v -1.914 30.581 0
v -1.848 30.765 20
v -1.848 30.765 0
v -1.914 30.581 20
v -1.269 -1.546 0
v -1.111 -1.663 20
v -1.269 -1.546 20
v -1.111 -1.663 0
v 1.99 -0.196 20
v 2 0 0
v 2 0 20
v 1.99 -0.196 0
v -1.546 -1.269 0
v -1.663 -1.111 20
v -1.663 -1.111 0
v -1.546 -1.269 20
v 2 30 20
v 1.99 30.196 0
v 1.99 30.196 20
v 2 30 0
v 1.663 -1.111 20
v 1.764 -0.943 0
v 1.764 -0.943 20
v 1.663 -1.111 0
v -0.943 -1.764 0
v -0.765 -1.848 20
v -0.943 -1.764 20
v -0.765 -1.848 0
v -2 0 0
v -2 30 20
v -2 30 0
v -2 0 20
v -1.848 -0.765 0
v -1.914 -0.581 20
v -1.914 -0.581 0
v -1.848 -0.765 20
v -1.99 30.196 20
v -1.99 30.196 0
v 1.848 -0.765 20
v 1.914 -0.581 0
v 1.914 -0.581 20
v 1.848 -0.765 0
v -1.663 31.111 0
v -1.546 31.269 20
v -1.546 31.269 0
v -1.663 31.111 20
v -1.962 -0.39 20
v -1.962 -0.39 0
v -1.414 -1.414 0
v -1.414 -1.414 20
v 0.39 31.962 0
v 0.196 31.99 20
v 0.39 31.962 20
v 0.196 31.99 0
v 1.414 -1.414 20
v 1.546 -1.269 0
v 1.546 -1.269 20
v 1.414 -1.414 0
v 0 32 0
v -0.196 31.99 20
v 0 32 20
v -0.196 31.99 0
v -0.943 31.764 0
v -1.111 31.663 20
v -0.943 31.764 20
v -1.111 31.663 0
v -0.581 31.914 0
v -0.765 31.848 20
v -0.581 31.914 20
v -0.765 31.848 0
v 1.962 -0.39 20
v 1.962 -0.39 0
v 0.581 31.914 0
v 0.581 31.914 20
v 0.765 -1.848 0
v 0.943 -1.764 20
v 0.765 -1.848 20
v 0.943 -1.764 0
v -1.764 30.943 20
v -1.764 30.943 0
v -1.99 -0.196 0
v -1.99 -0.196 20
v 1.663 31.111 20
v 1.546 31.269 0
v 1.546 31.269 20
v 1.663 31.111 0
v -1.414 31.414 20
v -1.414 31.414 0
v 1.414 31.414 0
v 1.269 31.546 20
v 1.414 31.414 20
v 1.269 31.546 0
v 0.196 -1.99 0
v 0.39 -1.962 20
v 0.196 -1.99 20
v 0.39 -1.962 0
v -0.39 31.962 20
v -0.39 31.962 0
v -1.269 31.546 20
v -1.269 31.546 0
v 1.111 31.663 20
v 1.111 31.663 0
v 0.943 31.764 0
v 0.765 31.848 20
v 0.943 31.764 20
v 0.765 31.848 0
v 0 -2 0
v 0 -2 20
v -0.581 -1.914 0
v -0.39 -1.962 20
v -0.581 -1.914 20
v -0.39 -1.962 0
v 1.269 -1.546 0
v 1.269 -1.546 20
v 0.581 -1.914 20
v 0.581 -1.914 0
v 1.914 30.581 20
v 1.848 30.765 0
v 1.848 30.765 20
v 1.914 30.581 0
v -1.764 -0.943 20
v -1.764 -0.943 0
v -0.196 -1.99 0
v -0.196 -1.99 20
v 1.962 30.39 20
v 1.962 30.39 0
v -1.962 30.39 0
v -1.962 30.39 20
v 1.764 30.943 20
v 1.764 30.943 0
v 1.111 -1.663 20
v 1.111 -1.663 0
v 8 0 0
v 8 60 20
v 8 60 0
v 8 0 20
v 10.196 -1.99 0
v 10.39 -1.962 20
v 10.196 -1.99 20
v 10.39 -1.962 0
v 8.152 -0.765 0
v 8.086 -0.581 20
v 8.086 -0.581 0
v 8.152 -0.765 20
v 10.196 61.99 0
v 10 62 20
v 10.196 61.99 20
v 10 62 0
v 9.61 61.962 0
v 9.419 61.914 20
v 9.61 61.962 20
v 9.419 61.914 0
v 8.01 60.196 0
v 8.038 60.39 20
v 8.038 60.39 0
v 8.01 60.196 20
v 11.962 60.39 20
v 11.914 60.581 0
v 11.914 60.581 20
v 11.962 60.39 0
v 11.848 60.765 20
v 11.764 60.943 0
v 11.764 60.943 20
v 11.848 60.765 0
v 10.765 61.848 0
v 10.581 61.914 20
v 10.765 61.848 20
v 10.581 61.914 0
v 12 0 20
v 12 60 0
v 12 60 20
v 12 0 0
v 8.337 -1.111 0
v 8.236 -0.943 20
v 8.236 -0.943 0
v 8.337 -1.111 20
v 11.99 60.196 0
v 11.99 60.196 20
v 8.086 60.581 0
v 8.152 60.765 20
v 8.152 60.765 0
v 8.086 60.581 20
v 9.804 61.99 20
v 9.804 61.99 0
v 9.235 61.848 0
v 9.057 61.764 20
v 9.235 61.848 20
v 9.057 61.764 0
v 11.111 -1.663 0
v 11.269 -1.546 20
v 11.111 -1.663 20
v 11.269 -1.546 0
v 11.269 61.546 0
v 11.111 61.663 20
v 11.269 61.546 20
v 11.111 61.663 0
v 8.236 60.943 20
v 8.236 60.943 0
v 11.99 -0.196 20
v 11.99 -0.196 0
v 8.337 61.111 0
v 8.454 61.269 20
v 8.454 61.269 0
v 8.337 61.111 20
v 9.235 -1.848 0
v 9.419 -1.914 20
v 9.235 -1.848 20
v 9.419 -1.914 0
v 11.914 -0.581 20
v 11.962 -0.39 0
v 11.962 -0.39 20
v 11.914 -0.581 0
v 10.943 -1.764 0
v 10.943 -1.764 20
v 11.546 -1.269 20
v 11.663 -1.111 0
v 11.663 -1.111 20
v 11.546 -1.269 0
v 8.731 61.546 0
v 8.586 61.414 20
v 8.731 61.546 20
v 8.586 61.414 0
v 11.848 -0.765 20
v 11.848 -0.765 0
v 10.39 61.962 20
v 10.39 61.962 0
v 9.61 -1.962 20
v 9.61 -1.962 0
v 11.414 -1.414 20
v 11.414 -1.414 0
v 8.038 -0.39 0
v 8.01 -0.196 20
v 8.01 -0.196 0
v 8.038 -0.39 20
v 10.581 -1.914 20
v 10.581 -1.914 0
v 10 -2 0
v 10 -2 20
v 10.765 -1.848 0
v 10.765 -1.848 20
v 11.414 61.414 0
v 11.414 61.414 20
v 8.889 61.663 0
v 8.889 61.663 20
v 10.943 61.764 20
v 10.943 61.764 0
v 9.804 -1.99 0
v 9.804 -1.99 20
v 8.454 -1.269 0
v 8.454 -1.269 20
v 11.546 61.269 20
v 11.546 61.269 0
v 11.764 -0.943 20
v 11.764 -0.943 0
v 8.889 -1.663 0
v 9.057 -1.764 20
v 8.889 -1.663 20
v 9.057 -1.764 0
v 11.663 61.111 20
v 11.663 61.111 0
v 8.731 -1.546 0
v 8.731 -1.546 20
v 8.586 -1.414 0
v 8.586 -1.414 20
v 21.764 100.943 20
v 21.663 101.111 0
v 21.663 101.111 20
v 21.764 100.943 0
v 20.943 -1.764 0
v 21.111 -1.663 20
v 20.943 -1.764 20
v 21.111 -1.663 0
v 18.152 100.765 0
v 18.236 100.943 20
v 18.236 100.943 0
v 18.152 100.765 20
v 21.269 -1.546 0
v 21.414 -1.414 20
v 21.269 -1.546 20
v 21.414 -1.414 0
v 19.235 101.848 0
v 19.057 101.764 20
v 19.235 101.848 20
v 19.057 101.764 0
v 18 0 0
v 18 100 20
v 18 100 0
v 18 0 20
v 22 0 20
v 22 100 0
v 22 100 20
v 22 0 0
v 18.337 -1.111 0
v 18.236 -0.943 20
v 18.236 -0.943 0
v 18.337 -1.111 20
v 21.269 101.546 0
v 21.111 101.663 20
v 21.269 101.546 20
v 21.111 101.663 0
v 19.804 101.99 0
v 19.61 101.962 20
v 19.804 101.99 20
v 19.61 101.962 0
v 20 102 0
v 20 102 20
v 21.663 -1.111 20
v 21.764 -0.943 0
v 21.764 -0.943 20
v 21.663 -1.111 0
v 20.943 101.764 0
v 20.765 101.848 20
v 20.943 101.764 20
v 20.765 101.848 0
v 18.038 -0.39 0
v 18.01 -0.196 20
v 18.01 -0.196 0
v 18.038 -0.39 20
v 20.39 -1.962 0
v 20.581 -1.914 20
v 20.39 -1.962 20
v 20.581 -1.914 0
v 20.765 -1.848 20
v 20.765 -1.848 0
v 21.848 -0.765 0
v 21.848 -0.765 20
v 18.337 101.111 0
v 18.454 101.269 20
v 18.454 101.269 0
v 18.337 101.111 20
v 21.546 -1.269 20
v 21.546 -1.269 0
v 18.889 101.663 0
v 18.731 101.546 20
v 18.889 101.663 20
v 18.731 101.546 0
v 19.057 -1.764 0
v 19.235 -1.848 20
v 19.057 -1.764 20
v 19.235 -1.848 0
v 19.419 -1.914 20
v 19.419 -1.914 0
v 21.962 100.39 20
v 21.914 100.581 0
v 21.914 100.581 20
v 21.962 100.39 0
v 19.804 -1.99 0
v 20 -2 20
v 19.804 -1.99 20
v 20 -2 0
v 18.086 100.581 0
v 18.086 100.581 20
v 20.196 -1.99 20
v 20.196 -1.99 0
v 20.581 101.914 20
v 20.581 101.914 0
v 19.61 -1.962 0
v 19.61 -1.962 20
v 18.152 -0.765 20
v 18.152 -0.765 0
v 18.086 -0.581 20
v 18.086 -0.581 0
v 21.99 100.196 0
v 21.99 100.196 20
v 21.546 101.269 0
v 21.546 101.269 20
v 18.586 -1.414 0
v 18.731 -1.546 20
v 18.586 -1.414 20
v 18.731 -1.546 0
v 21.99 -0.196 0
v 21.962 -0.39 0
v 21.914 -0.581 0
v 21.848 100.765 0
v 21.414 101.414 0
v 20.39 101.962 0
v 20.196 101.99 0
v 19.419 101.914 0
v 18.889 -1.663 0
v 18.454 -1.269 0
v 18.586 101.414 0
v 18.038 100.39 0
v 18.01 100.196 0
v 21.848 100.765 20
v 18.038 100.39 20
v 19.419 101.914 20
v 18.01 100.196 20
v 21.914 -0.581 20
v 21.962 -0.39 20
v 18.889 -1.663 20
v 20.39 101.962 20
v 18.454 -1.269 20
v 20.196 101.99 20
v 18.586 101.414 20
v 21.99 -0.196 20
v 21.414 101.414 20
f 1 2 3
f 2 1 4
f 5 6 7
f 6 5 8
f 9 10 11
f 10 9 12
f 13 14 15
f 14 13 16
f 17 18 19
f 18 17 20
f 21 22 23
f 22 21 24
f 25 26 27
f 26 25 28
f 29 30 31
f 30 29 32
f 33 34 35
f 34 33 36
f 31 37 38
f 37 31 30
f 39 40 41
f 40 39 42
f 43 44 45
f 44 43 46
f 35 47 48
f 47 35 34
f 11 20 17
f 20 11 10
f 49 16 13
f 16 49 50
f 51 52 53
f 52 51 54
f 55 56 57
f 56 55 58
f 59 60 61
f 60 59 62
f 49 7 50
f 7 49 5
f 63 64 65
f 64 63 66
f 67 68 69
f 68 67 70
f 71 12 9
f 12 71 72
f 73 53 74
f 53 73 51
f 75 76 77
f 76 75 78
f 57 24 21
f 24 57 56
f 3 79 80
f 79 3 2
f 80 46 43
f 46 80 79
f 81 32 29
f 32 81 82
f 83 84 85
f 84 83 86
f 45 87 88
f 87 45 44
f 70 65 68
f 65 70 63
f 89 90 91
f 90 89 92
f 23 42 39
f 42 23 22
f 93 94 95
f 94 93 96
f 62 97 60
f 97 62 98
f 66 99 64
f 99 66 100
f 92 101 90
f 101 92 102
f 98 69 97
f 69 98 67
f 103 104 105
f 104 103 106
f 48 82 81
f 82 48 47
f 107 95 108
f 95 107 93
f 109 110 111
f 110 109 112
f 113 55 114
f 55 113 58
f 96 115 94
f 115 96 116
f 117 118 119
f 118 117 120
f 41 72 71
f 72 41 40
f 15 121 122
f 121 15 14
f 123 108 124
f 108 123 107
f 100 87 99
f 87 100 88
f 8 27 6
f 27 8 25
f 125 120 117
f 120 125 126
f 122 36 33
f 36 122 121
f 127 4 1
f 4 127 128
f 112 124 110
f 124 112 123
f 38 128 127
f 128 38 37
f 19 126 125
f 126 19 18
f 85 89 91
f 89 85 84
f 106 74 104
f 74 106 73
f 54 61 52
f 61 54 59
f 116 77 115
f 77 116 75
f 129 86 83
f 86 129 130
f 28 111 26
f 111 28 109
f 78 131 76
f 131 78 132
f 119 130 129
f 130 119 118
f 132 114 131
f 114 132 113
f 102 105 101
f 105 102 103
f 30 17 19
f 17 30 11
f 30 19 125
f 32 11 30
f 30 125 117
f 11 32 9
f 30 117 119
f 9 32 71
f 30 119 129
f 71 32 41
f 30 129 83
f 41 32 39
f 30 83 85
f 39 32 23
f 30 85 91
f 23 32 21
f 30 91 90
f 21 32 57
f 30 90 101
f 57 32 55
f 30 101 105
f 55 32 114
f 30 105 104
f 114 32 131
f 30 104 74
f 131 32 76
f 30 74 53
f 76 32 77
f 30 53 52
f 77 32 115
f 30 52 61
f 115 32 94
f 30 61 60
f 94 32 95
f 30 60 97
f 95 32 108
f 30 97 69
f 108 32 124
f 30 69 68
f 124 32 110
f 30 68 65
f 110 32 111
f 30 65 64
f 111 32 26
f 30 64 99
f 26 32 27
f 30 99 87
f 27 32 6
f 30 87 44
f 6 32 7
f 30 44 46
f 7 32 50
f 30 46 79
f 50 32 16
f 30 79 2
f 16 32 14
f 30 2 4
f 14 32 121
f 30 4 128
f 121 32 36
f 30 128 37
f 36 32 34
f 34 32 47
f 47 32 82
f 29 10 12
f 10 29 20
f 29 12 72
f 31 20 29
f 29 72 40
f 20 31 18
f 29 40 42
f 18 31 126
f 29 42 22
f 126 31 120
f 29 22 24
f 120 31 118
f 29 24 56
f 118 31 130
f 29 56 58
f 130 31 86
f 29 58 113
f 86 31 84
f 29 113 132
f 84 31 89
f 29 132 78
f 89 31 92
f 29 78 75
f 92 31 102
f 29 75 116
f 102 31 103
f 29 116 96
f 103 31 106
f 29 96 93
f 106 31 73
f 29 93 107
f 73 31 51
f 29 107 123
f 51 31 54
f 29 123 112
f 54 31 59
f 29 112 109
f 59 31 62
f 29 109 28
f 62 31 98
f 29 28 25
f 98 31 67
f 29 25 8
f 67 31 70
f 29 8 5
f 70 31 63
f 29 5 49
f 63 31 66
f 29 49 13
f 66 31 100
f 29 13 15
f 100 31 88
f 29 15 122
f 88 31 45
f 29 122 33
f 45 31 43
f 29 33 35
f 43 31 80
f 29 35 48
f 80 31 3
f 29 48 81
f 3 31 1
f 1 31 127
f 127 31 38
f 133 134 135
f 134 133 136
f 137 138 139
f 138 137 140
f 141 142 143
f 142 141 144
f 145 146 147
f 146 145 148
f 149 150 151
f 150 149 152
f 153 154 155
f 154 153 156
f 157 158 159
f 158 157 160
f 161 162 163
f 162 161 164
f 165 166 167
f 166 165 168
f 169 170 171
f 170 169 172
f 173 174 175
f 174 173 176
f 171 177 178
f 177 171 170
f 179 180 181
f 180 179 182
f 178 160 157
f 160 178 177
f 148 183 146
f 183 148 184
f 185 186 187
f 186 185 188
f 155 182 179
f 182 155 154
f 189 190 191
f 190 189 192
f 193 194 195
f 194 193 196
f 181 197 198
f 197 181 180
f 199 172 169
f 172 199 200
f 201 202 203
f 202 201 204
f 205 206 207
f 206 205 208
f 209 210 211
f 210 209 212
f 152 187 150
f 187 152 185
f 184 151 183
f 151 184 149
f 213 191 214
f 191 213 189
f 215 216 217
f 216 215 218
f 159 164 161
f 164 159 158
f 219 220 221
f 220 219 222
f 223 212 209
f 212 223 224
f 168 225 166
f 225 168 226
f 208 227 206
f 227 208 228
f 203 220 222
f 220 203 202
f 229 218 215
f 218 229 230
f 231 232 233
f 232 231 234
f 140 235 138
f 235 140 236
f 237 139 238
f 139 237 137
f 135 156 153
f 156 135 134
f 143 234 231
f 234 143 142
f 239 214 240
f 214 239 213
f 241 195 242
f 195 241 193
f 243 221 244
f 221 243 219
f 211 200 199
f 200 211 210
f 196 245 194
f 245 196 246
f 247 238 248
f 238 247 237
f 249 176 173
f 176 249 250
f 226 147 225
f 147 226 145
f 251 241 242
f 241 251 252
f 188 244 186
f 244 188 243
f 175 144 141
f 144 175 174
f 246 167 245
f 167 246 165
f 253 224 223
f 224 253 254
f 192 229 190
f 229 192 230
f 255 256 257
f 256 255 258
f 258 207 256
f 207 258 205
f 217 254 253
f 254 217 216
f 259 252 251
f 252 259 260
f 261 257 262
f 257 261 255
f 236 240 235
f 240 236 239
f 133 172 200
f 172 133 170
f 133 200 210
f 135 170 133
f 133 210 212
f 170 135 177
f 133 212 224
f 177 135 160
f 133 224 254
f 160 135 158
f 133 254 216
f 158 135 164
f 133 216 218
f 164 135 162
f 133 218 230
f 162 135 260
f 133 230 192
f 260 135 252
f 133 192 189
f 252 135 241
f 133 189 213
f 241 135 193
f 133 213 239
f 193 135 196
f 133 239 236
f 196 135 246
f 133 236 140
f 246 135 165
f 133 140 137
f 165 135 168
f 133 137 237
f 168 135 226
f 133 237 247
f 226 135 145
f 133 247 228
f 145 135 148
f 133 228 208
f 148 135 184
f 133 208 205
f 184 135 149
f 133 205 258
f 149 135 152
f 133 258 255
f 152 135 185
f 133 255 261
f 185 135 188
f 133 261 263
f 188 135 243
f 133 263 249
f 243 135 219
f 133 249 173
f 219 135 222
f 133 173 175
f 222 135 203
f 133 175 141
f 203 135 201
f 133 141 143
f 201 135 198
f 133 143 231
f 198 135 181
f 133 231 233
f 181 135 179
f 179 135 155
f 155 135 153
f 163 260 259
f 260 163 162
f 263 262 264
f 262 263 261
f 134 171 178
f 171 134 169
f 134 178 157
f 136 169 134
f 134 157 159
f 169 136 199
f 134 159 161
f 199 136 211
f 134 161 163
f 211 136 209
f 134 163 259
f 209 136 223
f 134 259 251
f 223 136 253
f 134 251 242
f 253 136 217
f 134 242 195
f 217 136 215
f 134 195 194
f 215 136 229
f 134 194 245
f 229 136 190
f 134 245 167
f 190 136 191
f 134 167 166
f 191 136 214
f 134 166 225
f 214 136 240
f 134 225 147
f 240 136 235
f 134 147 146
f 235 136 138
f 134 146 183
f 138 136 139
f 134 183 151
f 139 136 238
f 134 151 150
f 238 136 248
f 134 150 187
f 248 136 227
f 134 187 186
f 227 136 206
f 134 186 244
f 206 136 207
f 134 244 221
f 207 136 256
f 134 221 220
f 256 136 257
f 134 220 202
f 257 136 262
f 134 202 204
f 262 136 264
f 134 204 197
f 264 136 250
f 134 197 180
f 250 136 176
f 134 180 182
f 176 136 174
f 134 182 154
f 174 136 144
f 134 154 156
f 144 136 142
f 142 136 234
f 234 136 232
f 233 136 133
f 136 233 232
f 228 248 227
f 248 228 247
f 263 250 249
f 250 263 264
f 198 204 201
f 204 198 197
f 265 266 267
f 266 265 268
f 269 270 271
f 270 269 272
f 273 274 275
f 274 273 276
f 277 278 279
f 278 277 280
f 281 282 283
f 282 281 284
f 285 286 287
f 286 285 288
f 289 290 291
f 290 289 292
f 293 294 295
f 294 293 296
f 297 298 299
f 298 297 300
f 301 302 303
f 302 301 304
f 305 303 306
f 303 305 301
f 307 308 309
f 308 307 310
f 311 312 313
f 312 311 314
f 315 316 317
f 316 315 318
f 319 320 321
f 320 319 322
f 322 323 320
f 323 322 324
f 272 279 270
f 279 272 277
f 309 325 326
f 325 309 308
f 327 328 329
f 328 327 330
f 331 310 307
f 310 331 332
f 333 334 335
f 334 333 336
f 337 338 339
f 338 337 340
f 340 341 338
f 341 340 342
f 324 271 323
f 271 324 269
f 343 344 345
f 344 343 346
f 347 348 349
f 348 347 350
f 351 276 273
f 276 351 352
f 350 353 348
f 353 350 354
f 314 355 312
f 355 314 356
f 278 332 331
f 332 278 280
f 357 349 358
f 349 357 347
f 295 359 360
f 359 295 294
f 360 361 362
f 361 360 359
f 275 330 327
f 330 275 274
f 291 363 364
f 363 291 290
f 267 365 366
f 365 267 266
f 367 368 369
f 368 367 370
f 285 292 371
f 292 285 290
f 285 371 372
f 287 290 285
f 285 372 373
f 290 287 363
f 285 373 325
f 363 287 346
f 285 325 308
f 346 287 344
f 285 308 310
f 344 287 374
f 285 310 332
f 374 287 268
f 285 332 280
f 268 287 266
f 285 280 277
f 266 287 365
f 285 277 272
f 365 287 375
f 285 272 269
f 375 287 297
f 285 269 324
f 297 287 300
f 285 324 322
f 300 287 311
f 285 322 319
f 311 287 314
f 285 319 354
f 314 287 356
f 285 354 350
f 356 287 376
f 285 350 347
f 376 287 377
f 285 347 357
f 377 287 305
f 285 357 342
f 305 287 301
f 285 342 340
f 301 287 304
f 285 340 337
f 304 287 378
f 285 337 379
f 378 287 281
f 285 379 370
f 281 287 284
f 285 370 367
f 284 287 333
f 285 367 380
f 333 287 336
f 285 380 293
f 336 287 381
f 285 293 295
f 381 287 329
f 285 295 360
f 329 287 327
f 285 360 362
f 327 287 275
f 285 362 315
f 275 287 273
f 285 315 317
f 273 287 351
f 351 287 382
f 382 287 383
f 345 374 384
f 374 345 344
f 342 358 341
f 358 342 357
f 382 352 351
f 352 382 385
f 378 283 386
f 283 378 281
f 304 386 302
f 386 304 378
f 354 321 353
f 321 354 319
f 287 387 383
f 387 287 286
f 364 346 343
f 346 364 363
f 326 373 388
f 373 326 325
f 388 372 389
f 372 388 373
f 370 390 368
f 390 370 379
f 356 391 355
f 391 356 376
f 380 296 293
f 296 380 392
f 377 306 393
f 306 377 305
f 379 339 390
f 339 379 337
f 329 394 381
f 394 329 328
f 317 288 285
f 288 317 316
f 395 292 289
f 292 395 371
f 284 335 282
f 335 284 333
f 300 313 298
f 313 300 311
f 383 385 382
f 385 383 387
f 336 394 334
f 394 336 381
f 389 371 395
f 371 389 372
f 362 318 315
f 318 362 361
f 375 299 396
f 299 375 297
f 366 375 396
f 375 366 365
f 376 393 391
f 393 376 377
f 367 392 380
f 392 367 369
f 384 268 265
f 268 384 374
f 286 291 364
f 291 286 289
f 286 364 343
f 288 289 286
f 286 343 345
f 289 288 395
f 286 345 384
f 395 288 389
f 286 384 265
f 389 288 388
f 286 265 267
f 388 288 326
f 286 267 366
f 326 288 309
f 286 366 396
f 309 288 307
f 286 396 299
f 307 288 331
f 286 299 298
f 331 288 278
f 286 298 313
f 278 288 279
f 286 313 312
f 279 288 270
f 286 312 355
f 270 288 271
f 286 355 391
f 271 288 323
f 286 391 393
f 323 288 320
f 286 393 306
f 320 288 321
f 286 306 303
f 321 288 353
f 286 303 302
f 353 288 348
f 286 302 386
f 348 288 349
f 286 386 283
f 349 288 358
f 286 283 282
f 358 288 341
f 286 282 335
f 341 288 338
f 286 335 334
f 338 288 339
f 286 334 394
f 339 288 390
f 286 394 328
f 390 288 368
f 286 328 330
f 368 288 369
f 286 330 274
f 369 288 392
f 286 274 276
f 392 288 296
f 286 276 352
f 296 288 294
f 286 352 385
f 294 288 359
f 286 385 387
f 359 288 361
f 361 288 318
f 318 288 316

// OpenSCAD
//
// Misc library
//
// by Yasuhiro Wabiko
//
// This work is licensed under a Creative Commons Attribution 4.0 International License.
// https://creativecommons.org/licenses/by/4.0/
//
// See
//    https://github.com/ywabiko/3d/blob/master/Speaker/README.md
// for build instructions.
//

WELDING=0.1;

round2_plate(30,20,2);

translate([10,0,0])
  round2_plate(60,20,2);

translate([20,0,0])
  round2_plate(100,20,2);


module round2_plate(width, height, radius)
{
    hull(){
        translate([0,0,0])
            cylinder(r=radius, h=height, $fn=64);
        translate([0,width,0])
            cylinder(r=radius, h=height, $fn=64);
    }
}


module round2_plate_triangled(width, height, radius1, radius2)
{
    hull(){
        translate([0,0,0])
            cylinder(r=radius1, h=height, $fn=64);
        translate([0,width,0])
            cylinder(r=radius2, h=height, $fn=64);
    }
}


// px,py,pz has to be larger than r*2
// alignment: (x,y,z) = (0, py0/2, 0)
module prim_round_cube(px0, py0, pz0,  pr0, pf)
{
    pr = pr0;
    px = px0 - pr*2;
    py = py0 - pr*2;
    pz = pz0 - pr*2;
    translate([(px+pr*2)/2, 0, (pz+pr*2)/2])
    minkowski(){
        cube([px, py, pz], center=true);
        sphere(r=pr, $fn=32);
    }
}

// px,py,pz has to be larger than r*2
// alignment: (x,y,z) = (0, py0/2, 0)
module prim_round_cube0(px0, py0, pz0,  pr0, pf)
{
    pr = pr0;
    px = px0 - pr*2;
    py = py0 - pr*2;
    pz = pz0 - pr*2;
    translate([0, 0, 0])
    minkowski(){
        cube([px, py, pz], center=true);
        sphere(r=pr, $fn=pf);
    }
}

// px0,py0 = width(x-axis),height(y-axis), center at (0,0), facing x-axis posiive
// pz = thickness (z-axis from z=0)
// pr = r
// fn = $fn
module prim_round_xplate(px0, py0, pz0,  pr, pf)
{
    px = px0;
    py = py0-pr*2;
    pz = pz0-pr*2;
      
    hull(){
        translate([0,-py/2,-pz/2])
          rotate([0,90,0])
            cylinder(r=pr, h=px, $fn=pf, center=true);
        translate([0,+py/2, -pz/2])
          rotate([0,90,0])
            cylinder(r=pr,h=px, $fn=pf, center=true);
        translate([0,-py/2, +pz/2])
          rotate([0,90,0])
            cylinder(r=pr,h=px, $fn=pf, center=true);
        translate([0,+py/2, +pz/2])
          rotate([0,90,0])
            cylinder(r=pr, h=px, $fn=pf, center=true);
    }
}

// center at (x/2,y/2,z/2), facing z-axis positive
module prim_round_zplate0(px0, py0, pz0,  pr, pf)
{
    px = px0-pr*2;
    py = py0-pr*2;
    pz = pz0;
    hull(){
        translate([ px/2,  py/2, 0])
            cylinder(r=pr, h=pz, $fn=pf, center=true);
        translate([-px/2,  py/2, 0])
            cylinder(r=pr, h=pz, $fn=pf, center=true);
        translate([ px/2, -py/2, 0])
            cylinder(r=pr, h=pz, $fn=pf, center=true);
        translate([-px/2, -py/2, 0])
            cylinder(r=pr, h=pz, $fn=pf, center=true);
    }    
}

// center at (x/2,y/2,z/2), facing x-axis positive
module prim_round_xplate0(pz0, py0, px0,  pr, pf)
{
    px = px0-pr*2;
    py = py0-pr*2;
    pz = pz0;
    rotate([0,90,0])
    hull(){
        translate([ px/2,  py/2, 0])
            cylinder(r=pr, h=pz, $fn=pf, center=true);
        translate([-px/2,  py/2, 0])
            cylinder(r=pr, h=pz, $fn=pf, center=true);
        translate([ px/2, -py/2, 0])
            cylinder(r=pr, h=pz, $fn=pf, center=true);
        translate([-px/2, -py/2, 0])
            cylinder(r=pr, h=pz, $fn=pf, center=true);
    }    
}

// center at (x/2,y/2,z/2), facing y-axis positive
module prim_round_yplate0(px0, pz0, py0, pr, pf)
{
    px = px0-pr*2;
    py = py0-pr*2;
    pz = pz0;
    rotate([90,0,0])
    hull(){
        translate([ px/2,  py/2, 0])
            cylinder(r=pr, h=pz, $fn=pf, center=true);
        translate([-px/2,  py/2, 0])
            cylinder(r=pr, h=pz, $fn=pf, center=true);
        translate([ px/2, -py/2, 0])
            cylinder(r=pr, h=pz, $fn=pf, center=true);
        translate([-px/2, -py/2, 0])
            cylinder(r=pr, h=pz, $fn=pf, center=true);
    }    
}


//
// Screw Holes
//
default_wall_t = 2;

// [Public]
// #2 1/8" screw hole (diameter 2mm x depth 3mm)
// wall thickness = 2mm by default, so overall dimension is 6mm x 6mm x 5mm high.
// align = { "none" : centered at (0,0,0) facing z-axis positive (same as zplate0)
//           "x"    : aligned to yz-plane, facing x-axis positive.
//           "y"    : aligned to zx-plane, facing y-axis positive.
//           "z"    : aligned to xy-plane, facing z-axis positive.
//          }
module screw_hole_d2_h3(align="none", wall_t = default_wall_t, volume_type="positive",
                        shell_x=0, shell_y=0, shell_z=0, with_shell=0){
    hole_d = 2;
    hole_z = 3;
    screw_hole_body(align=align, hole_d=hole_d, hole_z=hole_z, wall_t=wall_t, volume_type=volume_type,
                    shell_x=shell_x, shell_y=shell_y, shell_z=shell_z, with_shell=with_shell);
}

// [Public]
// #4-3/8" screw (diameter 2.8mm x depth 9.5mm)
// wall thickness = 2mm by default, so overall dimension is 6.8mm x 6.8mm x 9.7mm high.
// align = { "none" : centered at (0,0,0) facing z-axis positive (same as zplate0)
//           "x"    : aligned to yz-plane, facing x-axis positive.
//           "y"    : aligned to zx-plane, facing y-axis positive.
//           "z"    : aligned to xy-plane, facing z-axis positive.
//          }
module screw_hole_d28_h95(align="none", wall_t = default_wall_t, volume_type="positive",
                          shell_x=0, shell_y=0, shell_z=0, with_shell=0)
{
    hole_d = 2.8;
    hole_z = 9.5;
    screw_hole_body(align=align, hole_d=hole_d, hole_z=hole_z, wall_t=wall_t, volume_type=volume_type,
        shell_x=shell_x, shell_y=shell_y, shell_z=shell_z, with_shell=with_shell);
}


//
// internal modules
//

// Calculate shell dimension and delegate to each alignment-specific modules.
module screw_hole_body(align="none", hole_d, hole_z, wall_t = default_wall_t, volume_type="positive",
                       shell_x=0, shell_y=0, shell_z=0, with_shell=0) {

    unit_x = (1-with_shell)*(hole_d+wall_t*2) + with_shell*shell_x;
    unit_y = (1-with_shell)*(hole_d+wall_t*2) + with_shell*shell_y; 
    unit_z = (1-with_shell)*hole_z+wall_t + with_shell*shell_z;

    if (align == "none") {
        screw_hole_zplate0(hole_d=hole_d, hole_z=hole_z, wall_t=wall_t, unit_x=unit_x, unit_y=unit_y, unit_z=unit_z, volume_type=volume_type,
                           shell_x=shell_x, shell_y=shell_y, shell_z=shell_z, with_shell=with_shell);
    }
    if (align == "x") {
        screw_hole_align_x(hole_d=hole_d, hole_z=hole_z, wall_t=wall_t, unit_x=unit_x, unit_y=unit_y, unit_z=unit_z, volume_type=volume_type,
                           shell_x=shell_x, shell_y=shell_y, shell_z=shell_z, with_shell=with_shell);
    }
    if (align == "y") {
        screw_hole_align_y(hole_d=hole_d, hole_z=hole_z, wall_t=wall_t, unit_x=unit_x, unit_y=unit_y, unit_z=unit_z, volume_type=volume_type,
                           shell_x=shell_x, shell_y=shell_y, shell_z=shell_z, with_shell=with_shell);
    }
    if (align == "z") {
        screw_hole_align_z(hole_d=hole_d, hole_z=hole_z, wall_t=wall_t, unit_x=unit_x, unit_y=unit_y, unit_z=unit_z, volume_type=volume_type,
                           shell_x=shell_x, shell_y=shell_y, shell_z=shell_z, with_shell=with_shell);
    }
}

// align = { "x"    : face aligned to yz-plane, facing x-axis positive. }
module screw_hole_align_x(hole_d, hole_z, wall_t, unit_x, unit_y, unit_z, volume_type="positive")
{
    translate([-unit_z/2,0,0])
    {
        rotate([0,90,0]) {
            screw_hole_zplate0(hole_d=hole_d, hole_z=hole_z, wall_t=wall_t, unit_x=unit_x, unit_y=unit_y, unit_z=unit_z, volume_type=volume_type);
        }
    }
}

// align = { "y"    : face aligned to zx-plane, facing y-axis positive. }
module screw_hole_align_y(hole_d, hole_z, wall_t, unit_x, unit_y, unit_z, volume_type="positive")
{
    translate([0,-unit_z/2,0]){
        rotate([-90,0,0]) {
            screw_hole_zplate0(hole_d=hole_d, hole_z=hole_z, wall_t=wall_t, unit_x=unit_x, unit_y=unit_y, unit_z=unit_z, volume_type=volume_type);
        }
    }
}

// align = { "z"    : face aligned to xy-plane, facing z-axis positive. }
module screw_hole_align_z(hole_d, hole_z, wall_t, unit_x, unit_y, unit_z, volume_type="positive")
{
    translate([0,0,-unit_z/2])
    {
        rotate([0,0,0]) {
            screw_hole_zplate0(hole_d=hole_d, hole_z=hole_z, wall_t=wall_t, unit_x=unit_x, unit_y=unit_y, unit_z=unit_z, volume_type=volume_type);
        }
    }
}

// align = { "none" : centered at (0,0,0) facing z-axis positive (same as zplate0) }
module screw_hole_zplate0(hole_d, hole_z, wall_t, unit_x, unit_y, unit_z, volume_type="positive",
                          shell_x=0, shell_y=0, shell_z=0, with_shell=0) {

    if (volume_type == "positive") {
        difference() {
            cube([unit_x, unit_y, unit_z],center=true);
            screw_hole_negative_volume(hole_d=hole_d, hole_z=hole_z, wall_t=wall_t, unit_x=unit_x, unit_y=unit_y, unit_z=unit_z,
                                       shell_x=shell_x, shell_y=shell_y, shell_z=shell_z, with_shell=with_shell);
        }
    } else {
        screw_hole_negative_volume(hole_d=hole_d, hole_z=hole_z, wall_t=wall_t, unit_x=unit_x, unit_y=unit_y, unit_z=unit_z, 
                                   shell_x=shell_x, shell_y=shell_y, shell_z=shell_z, with_shell=with_shell);
    }
}

// negative volume for align = "none" mode. (same as zplate0)
module screw_hole_negative_volume(hole_d, hole_z, wall_t, unit_x, unit_y, unit_z, 
                                  shell_x=0, shell_y=0, shell_z=0, with_shell=0) {


    translate([0,0,unit_z/2-hole_z]) {
        cylinder(r=hole_d/2, h=hole_z+WELDING, $fn=16);
    }
}
